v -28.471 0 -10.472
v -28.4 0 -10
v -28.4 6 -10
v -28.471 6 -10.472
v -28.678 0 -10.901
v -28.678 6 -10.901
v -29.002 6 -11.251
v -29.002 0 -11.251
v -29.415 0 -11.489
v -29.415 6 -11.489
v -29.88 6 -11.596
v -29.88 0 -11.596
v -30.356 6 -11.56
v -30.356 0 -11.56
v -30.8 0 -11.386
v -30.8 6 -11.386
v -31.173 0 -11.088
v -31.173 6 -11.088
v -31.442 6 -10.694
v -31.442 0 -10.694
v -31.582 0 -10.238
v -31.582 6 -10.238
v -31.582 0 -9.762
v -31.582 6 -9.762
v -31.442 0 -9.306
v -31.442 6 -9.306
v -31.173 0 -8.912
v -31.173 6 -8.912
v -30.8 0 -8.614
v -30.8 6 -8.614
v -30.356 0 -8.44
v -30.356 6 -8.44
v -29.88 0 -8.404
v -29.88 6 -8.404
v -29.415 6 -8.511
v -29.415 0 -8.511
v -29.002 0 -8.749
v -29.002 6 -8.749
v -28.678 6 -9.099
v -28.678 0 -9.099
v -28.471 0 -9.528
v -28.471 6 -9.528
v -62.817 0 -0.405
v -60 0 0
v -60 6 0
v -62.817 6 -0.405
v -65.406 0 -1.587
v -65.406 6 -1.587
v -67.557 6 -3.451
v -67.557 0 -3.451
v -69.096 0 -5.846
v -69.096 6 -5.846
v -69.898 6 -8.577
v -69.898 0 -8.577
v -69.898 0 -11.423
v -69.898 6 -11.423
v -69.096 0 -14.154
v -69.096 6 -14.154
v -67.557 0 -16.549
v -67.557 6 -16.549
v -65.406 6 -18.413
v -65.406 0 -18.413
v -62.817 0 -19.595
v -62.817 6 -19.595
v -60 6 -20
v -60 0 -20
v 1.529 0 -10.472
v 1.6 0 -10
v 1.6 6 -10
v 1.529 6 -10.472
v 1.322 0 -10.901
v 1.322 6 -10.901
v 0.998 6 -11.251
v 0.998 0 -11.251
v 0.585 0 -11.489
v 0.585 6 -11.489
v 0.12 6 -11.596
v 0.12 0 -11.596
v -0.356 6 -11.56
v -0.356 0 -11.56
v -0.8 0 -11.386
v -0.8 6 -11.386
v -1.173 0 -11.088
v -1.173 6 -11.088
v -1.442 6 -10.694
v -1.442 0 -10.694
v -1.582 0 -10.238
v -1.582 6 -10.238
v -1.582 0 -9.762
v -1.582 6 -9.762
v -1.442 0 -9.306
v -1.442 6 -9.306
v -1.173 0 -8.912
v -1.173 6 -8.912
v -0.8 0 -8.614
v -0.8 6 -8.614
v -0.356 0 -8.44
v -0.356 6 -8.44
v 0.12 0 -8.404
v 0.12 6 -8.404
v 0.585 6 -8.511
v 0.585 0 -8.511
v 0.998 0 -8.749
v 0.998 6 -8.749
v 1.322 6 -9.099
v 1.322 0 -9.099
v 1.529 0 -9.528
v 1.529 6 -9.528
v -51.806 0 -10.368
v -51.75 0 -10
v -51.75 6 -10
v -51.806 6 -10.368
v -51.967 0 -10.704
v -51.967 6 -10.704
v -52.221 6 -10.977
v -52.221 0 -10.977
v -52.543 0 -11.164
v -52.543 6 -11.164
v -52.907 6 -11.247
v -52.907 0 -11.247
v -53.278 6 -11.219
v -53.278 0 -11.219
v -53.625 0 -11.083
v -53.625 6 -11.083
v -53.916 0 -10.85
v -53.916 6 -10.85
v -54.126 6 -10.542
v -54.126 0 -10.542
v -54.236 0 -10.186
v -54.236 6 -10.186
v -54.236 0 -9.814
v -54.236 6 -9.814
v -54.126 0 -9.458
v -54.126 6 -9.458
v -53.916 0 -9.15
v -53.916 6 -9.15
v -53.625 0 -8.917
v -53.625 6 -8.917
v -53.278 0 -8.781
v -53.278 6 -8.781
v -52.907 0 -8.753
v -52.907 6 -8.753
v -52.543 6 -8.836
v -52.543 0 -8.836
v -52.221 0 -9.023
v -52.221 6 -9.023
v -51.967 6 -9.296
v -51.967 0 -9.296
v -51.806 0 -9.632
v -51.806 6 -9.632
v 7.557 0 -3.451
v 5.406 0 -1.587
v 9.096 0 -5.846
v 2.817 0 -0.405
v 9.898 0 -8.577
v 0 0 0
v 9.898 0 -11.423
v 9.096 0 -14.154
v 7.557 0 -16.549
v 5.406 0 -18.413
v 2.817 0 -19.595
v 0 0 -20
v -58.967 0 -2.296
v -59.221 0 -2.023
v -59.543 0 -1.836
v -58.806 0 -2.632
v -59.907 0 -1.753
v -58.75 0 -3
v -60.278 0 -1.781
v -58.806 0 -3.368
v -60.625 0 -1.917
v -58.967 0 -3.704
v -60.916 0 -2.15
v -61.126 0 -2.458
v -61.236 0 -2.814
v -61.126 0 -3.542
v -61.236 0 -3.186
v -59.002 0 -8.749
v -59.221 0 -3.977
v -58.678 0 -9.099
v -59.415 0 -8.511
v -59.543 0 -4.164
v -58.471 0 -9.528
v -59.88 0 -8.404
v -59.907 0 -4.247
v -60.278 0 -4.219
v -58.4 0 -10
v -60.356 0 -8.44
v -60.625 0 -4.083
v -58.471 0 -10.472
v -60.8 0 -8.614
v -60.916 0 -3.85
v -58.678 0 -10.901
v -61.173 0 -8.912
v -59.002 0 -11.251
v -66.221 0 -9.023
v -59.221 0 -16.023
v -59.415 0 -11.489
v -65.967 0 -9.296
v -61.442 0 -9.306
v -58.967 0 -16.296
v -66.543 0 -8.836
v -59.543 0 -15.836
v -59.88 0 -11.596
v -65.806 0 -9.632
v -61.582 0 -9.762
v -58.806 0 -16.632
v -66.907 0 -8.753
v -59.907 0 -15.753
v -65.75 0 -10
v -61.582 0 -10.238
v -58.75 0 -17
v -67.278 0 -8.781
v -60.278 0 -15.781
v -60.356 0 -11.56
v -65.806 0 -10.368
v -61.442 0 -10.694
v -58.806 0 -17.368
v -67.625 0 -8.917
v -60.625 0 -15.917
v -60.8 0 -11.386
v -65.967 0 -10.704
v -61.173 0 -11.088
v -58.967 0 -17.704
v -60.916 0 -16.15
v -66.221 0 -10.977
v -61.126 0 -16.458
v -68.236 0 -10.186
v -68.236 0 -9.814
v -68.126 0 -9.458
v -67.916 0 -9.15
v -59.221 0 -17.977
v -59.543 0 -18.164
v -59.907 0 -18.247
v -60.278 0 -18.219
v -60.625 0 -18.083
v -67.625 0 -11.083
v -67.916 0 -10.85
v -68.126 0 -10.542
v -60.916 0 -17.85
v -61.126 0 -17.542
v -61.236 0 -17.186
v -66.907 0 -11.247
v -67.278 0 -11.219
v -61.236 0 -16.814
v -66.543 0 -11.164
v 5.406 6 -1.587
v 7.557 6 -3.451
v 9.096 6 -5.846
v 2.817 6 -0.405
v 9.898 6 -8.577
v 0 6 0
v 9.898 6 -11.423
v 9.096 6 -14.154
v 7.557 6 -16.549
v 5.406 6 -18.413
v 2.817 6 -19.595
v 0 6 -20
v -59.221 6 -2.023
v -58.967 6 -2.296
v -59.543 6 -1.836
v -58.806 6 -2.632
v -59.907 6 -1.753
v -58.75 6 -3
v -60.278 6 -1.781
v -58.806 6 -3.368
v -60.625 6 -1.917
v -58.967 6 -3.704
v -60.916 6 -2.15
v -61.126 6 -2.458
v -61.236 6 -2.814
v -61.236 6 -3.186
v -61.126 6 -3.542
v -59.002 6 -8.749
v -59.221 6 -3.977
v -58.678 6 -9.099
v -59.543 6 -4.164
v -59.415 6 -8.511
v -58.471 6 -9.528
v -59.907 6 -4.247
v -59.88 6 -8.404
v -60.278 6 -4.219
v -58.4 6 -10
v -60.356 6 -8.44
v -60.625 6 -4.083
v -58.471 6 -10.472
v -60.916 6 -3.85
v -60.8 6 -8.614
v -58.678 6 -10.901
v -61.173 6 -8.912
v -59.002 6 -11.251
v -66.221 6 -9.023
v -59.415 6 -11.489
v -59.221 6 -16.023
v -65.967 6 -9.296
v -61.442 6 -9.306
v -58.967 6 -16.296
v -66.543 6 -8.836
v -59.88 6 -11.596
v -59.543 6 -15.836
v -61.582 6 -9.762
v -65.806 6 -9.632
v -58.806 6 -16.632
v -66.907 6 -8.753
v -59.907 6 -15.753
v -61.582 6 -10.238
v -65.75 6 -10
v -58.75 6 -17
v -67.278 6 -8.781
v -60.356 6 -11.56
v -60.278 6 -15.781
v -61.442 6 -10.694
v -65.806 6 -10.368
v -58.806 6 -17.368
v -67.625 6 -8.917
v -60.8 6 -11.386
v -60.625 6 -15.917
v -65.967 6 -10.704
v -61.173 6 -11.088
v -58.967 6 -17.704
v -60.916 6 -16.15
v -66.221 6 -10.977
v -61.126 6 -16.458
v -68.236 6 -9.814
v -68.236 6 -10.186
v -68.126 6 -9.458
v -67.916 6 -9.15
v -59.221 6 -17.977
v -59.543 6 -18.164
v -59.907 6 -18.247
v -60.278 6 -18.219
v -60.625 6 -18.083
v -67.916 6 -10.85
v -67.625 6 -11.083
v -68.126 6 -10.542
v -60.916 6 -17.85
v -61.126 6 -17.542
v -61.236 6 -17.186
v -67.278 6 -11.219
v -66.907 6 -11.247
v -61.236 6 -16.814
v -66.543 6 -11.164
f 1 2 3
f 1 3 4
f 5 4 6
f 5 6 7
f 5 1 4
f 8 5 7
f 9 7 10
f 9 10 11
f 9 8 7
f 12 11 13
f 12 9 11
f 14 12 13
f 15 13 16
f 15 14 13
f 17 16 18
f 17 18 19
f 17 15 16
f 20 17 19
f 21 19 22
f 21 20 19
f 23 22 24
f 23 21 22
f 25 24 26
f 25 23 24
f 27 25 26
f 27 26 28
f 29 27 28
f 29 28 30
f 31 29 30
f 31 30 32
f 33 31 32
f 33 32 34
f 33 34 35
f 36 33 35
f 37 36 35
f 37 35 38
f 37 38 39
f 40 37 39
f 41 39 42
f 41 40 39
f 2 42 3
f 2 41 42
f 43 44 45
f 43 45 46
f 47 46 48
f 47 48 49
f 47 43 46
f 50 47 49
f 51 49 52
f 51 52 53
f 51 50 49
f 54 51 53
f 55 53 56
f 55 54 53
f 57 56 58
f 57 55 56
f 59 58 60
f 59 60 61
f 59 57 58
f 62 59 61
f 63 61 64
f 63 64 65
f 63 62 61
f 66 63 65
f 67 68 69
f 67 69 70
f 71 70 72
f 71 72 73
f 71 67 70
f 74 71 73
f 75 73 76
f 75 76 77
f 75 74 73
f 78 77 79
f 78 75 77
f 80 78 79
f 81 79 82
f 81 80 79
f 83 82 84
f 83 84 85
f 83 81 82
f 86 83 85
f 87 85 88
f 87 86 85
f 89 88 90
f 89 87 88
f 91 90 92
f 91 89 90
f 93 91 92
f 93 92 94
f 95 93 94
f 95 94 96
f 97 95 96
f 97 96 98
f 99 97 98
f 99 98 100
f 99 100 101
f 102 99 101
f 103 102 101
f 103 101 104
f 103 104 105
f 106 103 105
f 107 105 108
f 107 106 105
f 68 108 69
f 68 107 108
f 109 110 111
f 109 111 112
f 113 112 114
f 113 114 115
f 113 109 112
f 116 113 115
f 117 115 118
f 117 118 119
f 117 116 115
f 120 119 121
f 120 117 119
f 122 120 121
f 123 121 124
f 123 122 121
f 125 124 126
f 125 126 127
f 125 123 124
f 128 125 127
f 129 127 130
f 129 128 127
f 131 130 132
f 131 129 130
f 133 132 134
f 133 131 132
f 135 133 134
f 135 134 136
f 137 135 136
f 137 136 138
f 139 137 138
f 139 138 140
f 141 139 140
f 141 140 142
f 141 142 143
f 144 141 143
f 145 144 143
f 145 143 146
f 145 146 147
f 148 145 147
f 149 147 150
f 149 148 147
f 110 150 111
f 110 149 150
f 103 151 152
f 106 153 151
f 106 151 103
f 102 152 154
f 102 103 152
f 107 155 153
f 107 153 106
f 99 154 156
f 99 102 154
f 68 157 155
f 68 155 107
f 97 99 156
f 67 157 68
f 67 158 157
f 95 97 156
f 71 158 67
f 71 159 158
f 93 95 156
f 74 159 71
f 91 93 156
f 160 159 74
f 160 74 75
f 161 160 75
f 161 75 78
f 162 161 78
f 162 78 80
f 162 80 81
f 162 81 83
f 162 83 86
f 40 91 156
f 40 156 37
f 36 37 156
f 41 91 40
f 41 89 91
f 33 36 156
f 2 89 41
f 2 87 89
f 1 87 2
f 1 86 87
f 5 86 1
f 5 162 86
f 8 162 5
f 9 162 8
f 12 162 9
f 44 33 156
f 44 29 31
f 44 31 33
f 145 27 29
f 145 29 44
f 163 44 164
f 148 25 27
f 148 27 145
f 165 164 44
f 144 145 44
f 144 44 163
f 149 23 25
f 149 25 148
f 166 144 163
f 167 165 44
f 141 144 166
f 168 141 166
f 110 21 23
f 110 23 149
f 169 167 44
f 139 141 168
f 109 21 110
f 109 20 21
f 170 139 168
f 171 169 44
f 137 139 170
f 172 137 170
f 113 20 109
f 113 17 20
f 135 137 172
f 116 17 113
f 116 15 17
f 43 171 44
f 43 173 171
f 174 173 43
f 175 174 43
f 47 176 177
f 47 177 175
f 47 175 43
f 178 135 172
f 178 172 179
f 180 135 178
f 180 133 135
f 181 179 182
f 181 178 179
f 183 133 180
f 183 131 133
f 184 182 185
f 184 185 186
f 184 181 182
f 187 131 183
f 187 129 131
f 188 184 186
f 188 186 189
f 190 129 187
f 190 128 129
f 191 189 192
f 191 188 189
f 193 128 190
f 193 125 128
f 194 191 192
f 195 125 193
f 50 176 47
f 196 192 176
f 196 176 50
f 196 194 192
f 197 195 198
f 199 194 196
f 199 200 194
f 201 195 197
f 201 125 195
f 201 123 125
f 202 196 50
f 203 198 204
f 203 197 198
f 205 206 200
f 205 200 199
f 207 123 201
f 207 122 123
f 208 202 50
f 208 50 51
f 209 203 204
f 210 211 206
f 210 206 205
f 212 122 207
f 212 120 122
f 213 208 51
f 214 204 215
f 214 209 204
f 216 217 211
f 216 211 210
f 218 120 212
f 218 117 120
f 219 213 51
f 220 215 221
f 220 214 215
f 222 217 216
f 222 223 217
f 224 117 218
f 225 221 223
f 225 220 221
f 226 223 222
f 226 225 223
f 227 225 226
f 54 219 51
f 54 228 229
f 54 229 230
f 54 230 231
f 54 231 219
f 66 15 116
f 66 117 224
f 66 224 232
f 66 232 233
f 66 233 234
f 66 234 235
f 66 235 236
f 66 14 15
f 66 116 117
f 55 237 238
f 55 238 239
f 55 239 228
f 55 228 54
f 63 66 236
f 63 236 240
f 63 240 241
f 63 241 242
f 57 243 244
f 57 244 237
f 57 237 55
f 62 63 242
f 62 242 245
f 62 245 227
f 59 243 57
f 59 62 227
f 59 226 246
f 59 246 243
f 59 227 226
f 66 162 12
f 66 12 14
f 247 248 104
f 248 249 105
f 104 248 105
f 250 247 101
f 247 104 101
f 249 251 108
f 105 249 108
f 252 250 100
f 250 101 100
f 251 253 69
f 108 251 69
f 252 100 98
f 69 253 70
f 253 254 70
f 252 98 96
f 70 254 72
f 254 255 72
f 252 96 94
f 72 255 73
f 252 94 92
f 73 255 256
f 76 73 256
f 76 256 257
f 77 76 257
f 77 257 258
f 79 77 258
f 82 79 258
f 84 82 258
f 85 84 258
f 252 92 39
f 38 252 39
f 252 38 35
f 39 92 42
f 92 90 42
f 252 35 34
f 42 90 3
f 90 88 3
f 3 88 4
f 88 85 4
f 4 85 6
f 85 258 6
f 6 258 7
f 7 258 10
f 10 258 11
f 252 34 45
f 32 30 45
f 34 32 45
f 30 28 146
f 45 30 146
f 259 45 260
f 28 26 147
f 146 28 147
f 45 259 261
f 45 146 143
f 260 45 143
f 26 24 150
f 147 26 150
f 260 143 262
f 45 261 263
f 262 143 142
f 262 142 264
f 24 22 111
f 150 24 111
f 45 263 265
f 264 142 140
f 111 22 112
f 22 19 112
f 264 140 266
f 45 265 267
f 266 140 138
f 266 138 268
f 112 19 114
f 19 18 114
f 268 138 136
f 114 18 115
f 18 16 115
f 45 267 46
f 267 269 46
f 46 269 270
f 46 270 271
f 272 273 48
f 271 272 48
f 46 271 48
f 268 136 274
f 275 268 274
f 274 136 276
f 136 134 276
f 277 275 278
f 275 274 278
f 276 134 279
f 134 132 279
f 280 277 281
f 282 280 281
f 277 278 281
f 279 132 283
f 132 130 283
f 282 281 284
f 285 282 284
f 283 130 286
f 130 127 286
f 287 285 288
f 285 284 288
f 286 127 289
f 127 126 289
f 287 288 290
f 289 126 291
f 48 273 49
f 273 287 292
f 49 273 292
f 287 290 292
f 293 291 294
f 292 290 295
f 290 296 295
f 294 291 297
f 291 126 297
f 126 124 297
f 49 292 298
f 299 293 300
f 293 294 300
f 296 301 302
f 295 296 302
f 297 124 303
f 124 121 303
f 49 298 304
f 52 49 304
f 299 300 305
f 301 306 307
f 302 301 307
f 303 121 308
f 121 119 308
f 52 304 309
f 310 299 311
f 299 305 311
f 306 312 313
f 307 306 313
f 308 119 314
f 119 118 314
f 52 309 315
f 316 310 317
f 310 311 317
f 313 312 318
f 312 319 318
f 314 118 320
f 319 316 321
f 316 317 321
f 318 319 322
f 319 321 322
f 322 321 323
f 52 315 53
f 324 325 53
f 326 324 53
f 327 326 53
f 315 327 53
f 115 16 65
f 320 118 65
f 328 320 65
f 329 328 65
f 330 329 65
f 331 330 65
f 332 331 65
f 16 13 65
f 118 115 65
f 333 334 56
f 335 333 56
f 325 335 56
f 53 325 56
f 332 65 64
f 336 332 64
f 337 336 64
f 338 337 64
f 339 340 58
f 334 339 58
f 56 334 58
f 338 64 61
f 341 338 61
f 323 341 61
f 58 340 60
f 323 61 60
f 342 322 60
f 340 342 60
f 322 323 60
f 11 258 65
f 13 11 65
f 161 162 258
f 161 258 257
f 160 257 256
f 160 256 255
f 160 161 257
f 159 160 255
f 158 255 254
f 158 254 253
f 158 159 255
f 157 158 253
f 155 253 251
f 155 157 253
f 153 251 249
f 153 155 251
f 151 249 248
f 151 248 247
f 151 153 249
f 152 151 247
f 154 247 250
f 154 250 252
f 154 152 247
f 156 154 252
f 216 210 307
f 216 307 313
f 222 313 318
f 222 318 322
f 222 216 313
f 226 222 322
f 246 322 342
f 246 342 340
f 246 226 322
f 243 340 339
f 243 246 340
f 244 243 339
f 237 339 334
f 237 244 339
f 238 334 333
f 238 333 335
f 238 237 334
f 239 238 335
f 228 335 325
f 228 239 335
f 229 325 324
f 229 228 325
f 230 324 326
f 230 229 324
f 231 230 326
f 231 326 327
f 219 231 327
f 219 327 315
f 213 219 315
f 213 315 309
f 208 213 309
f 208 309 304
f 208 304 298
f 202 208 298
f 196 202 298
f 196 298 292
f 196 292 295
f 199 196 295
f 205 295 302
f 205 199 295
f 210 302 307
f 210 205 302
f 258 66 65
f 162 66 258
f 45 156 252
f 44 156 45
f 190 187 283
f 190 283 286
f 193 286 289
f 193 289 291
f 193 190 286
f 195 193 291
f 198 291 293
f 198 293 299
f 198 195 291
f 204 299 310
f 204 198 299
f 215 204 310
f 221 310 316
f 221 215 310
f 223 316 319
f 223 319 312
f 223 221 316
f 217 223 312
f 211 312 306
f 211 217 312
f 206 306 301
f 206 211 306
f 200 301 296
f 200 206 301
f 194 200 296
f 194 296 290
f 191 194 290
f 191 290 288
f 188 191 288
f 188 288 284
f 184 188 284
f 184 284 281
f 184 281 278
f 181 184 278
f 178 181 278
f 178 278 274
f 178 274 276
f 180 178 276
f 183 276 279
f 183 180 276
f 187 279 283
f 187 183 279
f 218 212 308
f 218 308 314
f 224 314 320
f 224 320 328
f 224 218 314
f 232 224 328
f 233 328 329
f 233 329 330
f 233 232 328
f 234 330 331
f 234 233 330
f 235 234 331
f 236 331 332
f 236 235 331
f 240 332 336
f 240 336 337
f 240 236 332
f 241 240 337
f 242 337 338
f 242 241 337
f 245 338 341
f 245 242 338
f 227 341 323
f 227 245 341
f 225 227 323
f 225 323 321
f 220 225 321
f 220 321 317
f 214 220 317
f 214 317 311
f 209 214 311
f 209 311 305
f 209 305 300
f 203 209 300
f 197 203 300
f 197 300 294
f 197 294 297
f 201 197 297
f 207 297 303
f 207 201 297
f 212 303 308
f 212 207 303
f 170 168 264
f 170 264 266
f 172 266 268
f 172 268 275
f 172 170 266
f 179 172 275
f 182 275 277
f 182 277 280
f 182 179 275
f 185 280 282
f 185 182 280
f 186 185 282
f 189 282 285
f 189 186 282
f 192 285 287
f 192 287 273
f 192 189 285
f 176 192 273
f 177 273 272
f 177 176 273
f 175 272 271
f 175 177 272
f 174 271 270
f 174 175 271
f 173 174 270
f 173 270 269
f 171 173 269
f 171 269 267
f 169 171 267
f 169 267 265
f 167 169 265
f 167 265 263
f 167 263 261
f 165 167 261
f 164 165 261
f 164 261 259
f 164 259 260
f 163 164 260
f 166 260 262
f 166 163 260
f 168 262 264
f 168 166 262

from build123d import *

# Parameters (mm, degrees)
SKETCH1_R           = 1.6
SKETCH1_R_2         = 1.25
BOSS_EXTRUDE1_DEPTH = 6


with BuildPart() as part:
    # Sketch1 → Boss-Extrude1 (new body)
    with BuildSketch(Plane(origin=(0, 0, 0), x_dir=(1, 0, 0), z_dir=(0, 1, 0))):
        with BuildLine():
            Line((0, 0), (-60, 0))
            ThreePointArc((-60, 0), (-70, 10), (-60, 20))
            Line((-60, 20), (0, 20))
            ThreePointArc((0, 20), (10, 10), (0, 0))
        make_face()
        with Locations((-60, 10)):
            Circle(SKETCH1_R, mode=Mode.SUBTRACT)
        with Locations((-60, 17)):
            Circle(SKETCH1_R_2, mode=Mode.SUBTRACT)
        with Locations((-60, 3)):
            Circle(SKETCH1_R_2, mode=Mode.SUBTRACT)
        with Locations((-67, 10)):
            Circle(SKETCH1_R_2, mode=Mode.SUBTRACT)
        with Locations((-53, 10)):
            Circle(SKETCH1_R_2, mode=Mode.SUBTRACT)
        with Locations((0, 10)):
            Circle(SKETCH1_R, mode=Mode.SUBTRACT)
        with Locations((-30, 10)):
            Circle(SKETCH1_R, mode=Mode.SUBTRACT)
    extrude(amount=BOSS_EXTRUDE1_DEPTH)


solid = part.part
